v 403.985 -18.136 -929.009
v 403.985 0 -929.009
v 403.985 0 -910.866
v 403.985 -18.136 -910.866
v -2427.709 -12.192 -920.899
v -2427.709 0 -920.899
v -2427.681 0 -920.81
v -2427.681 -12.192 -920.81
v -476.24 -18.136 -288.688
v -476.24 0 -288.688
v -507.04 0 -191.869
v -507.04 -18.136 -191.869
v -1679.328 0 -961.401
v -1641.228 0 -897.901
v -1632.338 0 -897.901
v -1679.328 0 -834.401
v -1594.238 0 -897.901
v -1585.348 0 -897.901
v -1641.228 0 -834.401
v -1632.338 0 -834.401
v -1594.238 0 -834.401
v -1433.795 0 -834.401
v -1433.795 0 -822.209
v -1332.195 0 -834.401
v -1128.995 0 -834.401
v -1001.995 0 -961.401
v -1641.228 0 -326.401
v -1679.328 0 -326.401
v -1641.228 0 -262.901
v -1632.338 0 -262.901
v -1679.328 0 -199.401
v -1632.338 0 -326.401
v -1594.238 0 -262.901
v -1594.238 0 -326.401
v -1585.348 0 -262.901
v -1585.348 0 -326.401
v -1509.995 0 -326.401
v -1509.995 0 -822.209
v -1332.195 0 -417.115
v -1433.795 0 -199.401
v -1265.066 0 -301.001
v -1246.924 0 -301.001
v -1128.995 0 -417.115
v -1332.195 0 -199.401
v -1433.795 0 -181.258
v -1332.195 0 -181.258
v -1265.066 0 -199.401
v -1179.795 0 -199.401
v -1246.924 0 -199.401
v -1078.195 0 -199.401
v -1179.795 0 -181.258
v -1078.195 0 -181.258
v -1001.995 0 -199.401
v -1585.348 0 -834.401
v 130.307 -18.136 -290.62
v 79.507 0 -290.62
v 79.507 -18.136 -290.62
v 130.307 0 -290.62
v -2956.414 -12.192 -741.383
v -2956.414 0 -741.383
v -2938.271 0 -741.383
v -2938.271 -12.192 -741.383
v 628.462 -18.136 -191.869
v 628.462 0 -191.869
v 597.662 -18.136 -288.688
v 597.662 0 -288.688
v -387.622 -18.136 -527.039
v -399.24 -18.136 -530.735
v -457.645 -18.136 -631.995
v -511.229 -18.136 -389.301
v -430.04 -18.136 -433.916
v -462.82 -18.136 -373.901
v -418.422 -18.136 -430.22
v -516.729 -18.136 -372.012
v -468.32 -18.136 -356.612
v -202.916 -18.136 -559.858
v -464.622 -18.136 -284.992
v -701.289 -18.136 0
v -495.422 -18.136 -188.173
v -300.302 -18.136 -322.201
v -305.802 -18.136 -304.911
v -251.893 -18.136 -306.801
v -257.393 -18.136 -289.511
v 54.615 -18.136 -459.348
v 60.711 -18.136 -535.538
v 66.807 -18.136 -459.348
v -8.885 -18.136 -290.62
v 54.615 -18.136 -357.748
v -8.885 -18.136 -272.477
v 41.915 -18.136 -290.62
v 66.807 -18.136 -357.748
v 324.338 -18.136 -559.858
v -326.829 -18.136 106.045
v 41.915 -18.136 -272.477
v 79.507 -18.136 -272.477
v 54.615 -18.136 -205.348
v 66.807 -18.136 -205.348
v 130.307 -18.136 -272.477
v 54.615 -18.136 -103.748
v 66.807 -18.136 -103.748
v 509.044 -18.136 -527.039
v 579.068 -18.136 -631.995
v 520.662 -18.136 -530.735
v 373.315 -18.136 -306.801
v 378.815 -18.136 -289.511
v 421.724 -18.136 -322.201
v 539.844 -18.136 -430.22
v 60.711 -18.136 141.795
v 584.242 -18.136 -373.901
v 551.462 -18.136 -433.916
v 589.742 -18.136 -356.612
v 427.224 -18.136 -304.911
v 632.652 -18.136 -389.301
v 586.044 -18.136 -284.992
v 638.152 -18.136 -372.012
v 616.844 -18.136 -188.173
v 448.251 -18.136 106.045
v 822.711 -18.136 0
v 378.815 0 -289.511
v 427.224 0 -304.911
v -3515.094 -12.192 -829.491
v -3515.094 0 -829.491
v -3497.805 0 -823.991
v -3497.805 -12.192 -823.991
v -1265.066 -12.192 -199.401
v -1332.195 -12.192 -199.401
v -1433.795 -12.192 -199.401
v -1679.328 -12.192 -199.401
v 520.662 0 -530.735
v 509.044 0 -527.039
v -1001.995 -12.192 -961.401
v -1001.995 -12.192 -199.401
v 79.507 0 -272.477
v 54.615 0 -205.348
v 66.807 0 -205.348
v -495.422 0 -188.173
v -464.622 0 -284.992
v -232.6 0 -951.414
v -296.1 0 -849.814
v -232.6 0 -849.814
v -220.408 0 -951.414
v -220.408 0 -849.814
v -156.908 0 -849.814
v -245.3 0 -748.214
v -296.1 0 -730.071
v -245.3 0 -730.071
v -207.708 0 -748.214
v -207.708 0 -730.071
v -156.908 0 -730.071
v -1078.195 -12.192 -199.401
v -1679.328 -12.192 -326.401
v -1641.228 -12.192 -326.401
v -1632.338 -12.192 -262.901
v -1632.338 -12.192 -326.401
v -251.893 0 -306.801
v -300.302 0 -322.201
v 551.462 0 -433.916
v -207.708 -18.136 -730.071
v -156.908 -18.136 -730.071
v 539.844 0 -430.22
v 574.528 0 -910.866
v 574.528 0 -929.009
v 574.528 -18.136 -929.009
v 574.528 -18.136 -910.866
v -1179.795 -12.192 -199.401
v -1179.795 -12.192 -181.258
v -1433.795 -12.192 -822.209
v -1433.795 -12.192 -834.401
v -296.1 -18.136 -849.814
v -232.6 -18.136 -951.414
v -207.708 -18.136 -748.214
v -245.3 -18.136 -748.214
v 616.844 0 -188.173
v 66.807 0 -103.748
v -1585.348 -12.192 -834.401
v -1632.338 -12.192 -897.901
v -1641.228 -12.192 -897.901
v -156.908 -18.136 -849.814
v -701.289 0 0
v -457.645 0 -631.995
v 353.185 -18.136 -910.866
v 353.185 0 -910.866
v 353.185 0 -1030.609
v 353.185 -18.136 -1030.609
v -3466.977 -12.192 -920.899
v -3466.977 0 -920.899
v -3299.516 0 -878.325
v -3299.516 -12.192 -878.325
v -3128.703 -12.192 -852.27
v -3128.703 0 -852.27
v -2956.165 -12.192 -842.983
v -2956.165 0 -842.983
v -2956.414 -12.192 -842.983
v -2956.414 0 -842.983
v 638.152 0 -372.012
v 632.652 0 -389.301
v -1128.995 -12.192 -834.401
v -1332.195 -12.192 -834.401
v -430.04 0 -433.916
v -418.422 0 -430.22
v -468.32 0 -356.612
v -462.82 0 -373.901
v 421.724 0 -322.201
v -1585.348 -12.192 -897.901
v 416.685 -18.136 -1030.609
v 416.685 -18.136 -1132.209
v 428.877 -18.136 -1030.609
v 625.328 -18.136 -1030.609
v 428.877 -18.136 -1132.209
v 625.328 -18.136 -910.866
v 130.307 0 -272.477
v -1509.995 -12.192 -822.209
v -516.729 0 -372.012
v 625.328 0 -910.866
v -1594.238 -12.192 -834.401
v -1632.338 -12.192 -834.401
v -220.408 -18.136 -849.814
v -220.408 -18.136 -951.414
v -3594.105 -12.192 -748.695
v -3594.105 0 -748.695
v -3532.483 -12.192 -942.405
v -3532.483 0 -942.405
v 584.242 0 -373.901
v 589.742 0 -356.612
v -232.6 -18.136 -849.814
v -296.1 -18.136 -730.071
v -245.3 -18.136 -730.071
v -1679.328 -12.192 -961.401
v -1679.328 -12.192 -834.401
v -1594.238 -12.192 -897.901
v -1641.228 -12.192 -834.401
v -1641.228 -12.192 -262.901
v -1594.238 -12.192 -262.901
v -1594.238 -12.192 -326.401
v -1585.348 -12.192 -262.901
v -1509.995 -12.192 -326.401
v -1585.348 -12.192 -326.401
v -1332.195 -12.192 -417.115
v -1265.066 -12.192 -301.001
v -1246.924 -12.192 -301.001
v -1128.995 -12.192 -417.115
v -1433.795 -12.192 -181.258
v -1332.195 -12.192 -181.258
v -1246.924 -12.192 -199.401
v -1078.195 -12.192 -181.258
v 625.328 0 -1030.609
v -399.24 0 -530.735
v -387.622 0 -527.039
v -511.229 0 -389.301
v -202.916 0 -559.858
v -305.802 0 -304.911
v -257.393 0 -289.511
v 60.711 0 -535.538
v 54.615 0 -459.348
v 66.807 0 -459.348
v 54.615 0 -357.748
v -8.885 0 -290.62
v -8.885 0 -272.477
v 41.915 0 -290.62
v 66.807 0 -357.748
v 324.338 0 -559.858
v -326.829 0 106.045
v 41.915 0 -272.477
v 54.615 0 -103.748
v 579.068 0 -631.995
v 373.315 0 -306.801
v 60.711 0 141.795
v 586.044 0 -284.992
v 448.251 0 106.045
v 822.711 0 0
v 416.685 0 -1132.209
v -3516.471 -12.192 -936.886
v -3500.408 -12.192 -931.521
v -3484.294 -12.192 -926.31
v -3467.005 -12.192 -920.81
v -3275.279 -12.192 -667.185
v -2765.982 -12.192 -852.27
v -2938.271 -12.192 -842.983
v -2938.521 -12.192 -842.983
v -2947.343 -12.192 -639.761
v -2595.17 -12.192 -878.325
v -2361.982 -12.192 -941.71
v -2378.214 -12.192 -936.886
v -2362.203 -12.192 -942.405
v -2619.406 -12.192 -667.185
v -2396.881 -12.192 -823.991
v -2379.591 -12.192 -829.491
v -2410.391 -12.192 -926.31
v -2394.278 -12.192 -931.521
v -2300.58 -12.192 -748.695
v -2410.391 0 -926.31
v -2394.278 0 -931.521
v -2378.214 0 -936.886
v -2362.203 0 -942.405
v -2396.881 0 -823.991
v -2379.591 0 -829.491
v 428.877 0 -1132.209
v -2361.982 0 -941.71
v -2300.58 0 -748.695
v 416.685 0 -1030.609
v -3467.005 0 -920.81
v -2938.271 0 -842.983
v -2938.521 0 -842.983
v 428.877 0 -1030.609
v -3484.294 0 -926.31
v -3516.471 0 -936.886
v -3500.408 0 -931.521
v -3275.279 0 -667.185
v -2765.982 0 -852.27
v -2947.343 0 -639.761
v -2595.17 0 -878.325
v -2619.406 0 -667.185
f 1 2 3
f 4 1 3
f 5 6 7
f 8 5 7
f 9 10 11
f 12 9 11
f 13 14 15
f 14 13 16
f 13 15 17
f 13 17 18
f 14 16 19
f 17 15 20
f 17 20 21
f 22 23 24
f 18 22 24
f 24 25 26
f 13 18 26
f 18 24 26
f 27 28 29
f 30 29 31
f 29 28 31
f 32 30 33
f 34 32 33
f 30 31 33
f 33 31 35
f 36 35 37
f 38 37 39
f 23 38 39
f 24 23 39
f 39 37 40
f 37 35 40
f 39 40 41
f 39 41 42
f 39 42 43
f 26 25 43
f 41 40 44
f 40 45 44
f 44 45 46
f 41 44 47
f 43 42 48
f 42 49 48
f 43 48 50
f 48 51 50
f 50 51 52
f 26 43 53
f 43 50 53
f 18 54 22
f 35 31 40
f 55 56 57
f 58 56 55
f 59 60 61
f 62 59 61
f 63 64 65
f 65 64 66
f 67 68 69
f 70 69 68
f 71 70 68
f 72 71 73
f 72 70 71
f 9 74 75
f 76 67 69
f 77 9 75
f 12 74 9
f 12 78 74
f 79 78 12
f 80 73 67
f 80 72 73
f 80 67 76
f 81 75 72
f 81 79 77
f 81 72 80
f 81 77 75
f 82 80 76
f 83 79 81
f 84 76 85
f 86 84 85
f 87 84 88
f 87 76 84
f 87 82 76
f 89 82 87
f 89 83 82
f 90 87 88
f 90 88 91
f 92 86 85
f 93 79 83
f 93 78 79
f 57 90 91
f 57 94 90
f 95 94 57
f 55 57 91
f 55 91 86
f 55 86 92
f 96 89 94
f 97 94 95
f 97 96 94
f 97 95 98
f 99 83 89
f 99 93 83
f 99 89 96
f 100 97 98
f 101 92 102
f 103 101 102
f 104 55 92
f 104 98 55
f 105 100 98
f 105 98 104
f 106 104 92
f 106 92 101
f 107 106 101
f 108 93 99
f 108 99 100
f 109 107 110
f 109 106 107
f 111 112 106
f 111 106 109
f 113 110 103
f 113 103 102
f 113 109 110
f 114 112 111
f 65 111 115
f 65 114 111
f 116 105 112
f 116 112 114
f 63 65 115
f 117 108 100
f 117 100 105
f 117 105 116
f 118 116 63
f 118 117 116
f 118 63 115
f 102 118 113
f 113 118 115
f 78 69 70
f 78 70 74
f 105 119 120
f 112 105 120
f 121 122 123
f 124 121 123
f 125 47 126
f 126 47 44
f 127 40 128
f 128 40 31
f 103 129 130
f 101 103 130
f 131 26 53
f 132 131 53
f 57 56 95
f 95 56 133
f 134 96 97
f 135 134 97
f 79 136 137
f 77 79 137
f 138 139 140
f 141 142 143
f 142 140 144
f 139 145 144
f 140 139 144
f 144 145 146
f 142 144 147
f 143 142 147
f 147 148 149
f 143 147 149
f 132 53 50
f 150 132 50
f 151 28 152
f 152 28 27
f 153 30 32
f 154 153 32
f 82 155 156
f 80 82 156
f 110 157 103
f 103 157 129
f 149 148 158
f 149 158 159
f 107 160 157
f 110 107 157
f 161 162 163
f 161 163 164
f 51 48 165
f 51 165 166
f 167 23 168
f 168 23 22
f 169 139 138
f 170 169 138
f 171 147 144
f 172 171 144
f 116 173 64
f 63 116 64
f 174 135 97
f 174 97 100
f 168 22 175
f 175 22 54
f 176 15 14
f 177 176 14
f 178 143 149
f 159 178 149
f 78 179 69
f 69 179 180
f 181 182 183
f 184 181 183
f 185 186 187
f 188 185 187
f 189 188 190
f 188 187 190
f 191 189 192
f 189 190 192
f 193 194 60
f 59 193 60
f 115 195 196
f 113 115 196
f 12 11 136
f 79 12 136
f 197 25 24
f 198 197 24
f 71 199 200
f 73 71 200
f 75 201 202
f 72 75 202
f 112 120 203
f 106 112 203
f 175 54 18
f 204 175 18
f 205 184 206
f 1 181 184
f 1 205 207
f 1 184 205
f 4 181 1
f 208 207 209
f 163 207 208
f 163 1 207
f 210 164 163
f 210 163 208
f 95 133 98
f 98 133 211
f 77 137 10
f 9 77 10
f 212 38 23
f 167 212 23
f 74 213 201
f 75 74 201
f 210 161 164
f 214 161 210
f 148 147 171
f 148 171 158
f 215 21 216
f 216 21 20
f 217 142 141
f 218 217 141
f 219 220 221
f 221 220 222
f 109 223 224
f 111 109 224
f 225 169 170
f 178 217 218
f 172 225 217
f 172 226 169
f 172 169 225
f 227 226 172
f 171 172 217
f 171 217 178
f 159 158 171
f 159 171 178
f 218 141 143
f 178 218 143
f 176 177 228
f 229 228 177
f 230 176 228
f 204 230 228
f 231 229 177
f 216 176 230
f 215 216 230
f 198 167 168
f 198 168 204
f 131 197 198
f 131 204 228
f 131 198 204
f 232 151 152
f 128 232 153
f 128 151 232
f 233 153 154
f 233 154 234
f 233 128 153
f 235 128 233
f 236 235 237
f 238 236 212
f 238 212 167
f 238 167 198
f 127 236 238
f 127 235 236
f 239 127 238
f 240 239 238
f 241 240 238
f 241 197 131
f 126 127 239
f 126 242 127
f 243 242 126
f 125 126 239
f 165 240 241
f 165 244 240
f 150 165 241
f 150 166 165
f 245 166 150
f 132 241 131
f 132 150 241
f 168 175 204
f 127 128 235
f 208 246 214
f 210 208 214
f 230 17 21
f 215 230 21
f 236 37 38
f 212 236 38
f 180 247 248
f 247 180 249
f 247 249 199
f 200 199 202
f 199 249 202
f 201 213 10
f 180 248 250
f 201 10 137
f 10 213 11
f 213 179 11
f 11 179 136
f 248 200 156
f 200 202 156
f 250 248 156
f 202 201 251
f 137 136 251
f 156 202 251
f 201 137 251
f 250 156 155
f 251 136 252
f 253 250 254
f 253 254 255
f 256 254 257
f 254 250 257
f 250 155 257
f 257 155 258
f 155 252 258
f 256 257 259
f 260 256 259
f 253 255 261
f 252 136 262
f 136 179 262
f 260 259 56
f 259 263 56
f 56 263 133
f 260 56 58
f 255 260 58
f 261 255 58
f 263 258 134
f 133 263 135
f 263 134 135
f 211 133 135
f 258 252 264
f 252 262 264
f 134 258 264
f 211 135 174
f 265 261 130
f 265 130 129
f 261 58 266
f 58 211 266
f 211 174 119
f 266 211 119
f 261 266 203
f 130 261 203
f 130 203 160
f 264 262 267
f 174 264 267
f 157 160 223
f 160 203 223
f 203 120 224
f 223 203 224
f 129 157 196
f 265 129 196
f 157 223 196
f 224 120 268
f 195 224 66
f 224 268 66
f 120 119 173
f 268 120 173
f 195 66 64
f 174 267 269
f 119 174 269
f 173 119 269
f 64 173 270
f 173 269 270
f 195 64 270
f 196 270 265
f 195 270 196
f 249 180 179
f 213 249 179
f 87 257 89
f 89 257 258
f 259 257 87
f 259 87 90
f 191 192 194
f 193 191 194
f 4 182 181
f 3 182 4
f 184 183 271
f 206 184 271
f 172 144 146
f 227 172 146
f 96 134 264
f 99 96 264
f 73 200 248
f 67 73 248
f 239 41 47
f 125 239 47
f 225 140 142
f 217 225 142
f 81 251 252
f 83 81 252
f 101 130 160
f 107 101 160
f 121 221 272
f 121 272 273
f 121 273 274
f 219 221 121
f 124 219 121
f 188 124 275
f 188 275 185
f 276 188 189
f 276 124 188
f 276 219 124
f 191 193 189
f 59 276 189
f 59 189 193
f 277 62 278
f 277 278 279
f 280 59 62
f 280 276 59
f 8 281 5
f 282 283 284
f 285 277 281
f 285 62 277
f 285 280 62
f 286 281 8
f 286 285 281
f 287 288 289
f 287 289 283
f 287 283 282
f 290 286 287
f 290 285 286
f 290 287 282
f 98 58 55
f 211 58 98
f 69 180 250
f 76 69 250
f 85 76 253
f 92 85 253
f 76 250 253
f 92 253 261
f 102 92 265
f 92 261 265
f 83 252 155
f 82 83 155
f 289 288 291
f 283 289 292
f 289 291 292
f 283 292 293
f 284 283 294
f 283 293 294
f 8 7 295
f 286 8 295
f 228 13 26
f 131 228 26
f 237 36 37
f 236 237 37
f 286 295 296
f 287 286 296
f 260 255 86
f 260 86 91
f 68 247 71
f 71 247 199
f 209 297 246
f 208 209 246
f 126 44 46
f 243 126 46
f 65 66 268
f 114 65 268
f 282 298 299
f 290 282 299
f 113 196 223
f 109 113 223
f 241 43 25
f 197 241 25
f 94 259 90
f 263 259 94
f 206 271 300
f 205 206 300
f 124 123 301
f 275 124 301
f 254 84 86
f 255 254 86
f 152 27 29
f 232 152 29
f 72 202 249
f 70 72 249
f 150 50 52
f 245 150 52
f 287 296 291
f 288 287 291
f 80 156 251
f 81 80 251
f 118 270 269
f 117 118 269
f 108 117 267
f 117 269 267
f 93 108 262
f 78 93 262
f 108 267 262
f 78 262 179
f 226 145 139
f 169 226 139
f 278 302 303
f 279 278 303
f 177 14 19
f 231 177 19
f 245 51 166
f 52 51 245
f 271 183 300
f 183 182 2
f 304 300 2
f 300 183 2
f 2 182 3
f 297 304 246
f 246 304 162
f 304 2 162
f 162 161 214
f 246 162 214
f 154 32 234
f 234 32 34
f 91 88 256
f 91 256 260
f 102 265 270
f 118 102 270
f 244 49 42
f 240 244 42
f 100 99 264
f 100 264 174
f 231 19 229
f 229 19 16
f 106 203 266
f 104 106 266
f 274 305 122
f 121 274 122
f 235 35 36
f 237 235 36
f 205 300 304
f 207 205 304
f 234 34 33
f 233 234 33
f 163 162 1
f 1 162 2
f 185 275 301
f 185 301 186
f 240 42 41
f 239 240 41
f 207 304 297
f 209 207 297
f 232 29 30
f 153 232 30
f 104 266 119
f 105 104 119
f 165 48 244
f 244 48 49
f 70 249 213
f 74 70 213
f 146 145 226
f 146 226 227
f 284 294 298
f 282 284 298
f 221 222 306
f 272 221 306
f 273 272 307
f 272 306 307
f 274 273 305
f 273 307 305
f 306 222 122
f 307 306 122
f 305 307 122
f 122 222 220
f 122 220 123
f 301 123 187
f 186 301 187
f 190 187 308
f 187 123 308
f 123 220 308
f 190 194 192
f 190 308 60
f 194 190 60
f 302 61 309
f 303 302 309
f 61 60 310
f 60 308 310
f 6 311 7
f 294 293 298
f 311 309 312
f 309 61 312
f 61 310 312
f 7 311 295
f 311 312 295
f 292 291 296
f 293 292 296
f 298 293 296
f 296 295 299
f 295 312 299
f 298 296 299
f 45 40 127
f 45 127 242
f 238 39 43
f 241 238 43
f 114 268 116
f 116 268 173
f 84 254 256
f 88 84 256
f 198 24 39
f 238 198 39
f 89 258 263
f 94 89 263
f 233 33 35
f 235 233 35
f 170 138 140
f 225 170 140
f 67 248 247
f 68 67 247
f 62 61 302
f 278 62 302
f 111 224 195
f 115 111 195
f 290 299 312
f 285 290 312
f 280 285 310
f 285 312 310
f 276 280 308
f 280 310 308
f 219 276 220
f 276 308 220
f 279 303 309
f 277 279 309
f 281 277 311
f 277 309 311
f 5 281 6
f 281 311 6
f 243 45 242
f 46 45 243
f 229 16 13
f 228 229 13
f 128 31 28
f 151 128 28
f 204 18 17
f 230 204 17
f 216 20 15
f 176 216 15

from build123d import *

# Parameters (mm, degrees)
F0_W     = 50.8
F0_H     = 18.1428571429
F1_DEPTH = 18.1356
F0_W_2   = 12.192
F0_H_2   = 101.6
F2_DEPTH = 12.192
F0_W_3   = 101.6


# Not quite as in the source:
# - a feature names something its author has since deleted; it is built from what else it names


with BuildPart() as f1:
    # F0 (on Front) → F1 (new body)
    with BuildSketch(Plane.XZ):
        Polygon((-245.2995117426, -748.2141169548), (-296.0995117426, -748.2141169548), (-296.0995117426, -849.8141169548), (-232.5995117426, -951.4141169548), (-232.5995117426, -849.8141169548), (-220.4075117426, -849.8141169548), (-220.4075117426, -951.4141169548), (-156.9075117426, -849.8141169548), (-156.9075117426, -748.2141169548), (-207.7075117426, -748.2141169548), align=None)
        with Locations((-182.3075117426, -739.1426883834)):
            Rectangle(F0_W, F0_H)
        with Locations((-270.6995117426, -739.1426883834)):
            Rectangle(F0_W, F0_H)
    extrude(amount=F1_DEPTH)


with BuildPart() as f1b:
    # F0 (on Front) → F1, piece 2 (new body)
    with BuildSketch(Plane.XZ):
        with BuildLine():
            Line((579.0676757709, -631.9954848741), (822.7111684876, 0))
            ThreePointArc((822.7111684876, 0), (60.7111684876, 141.7950471023), (-701.2888315124, 0))
            Line((-701.2888315124, 0), (-457.6453387957, -631.9954848741))
            ThreePointArc((-457.6453387957, -631.9954848741), (60.7111684876, -535.538286231), (579.0676757709, -631.9954848741))
        make_face()
        Polygon((-399.2400596646, -530.7352252686), (-430.0400842711, -433.9162266978), (-418.4218044426, -430.220223745), (-387.6217798361, -527.0392223158), align=None, mode=Mode.SUBTRACT)
        Polygon((-511.2292535926, -389.3006604553), (-516.7292579866, -372.0115535677), (-468.3197587013, -356.6115412645), (-462.8197543072, -373.9006481521), align=None, mode=Mode.SUBTRACT)
        Polygon((-464.6218413522, -284.9917258889), (-476.2401211807, -288.6877288417), (-507.0401457871, -191.8687302709), (-495.4218659586, -188.1727273182), align=None, mode=Mode.SUBTRACT)
        with Locations((60.7111684876, -408.5482073413)):
            Rectangle(F0_W_2, F0_H_2, mode=Mode.SUBTRACT)
        Polygon((539.8441414177, -430.220223745), (551.4624212462, -433.9162266978), (520.6623966398, -530.7352252686), (509.0441168113, -527.0392223158), align=None, mode=Mode.SUBTRACT)
        Polygon((589.7420956764, -356.6115412645), (638.1515949618, -372.0115535677), (632.6515905678, -389.3006604553), (584.2420912824, -373.9006481521), align=None, mode=Mode.SUBTRACT)
        Polygon((-300.3021495635, -322.2006068485), (-305.8021539575, -304.9114999608), (-257.3926546721, -289.5114876576), (-251.8926502781, -306.8005945453), align=None, mode=Mode.SUBTRACT)
        with Locations((16.5151684876, -281.5482073413)):
            Rectangle(F0_W, F0_H, mode=Mode.SUBTRACT)
        with Locations((104.9071684876, -281.5482073413)):
            Rectangle(F0_W, F0_H, mode=Mode.SUBTRACT)
        Polygon((373.3149872532, -306.8005945453), (378.8149916472, -289.5114876576), (427.2244909326, -304.9114999608), (421.7244865386, -322.2006068485), align=None, mode=Mode.SUBTRACT)
        Polygon((628.4624827623, -191.8687302709), (597.6624581558, -288.6877288417), (586.0441783273, -284.9917258889), (616.8442029338, -188.1727273182), align=None, mode=Mode.SUBTRACT)
        with Locations((60.7111684876, -154.5482073413)):
            Rectangle(F0_W_2, F0_H_2, mode=Mode.SUBTRACT)
    extrude(amount=F1_DEPTH)


with BuildPart() as f1c:
    # F0 (on Front) → F1, piece 3 (new body)
    with BuildSketch(Plane.XZ):
        with Locations((378.5851431642, -919.9377022879)):
            Rectangle(F0_W, F0_H)
        Polygon((403.9851431642, -929.0091308594), (353.1851431642, -929.0091308594), (353.1851431642, -1030.6091308594), (416.6851431642, -1132.2091308594), (416.6851431642, -1030.6091308594), (428.8771431642, -1030.6091308594), (428.8771431642, -1132.2091308594), (625.3280003071, -1030.6091308594), (625.3280003071, -929.0091308594), (574.5280003071, -929.0091308594), align=None)
        with Locations((599.9280003071, -919.9377022879)):
            Rectangle(F0_W, F0_H)
    extrude(amount=F1_DEPTH)


with BuildPart() as f2:
    # F0 (on Front) → F2 (new body)
    with BuildSketch(Plane.XZ):
        with BuildLine():
            Line((-2956.4141467797, -741.3827241583), (-2938.2712896368, -741.3827241583))
            Line((-2938.2712896368, -741.3827241583), (-2938.2712896368, -842.9827241583))
            Line((-2938.2712896368, -842.9827241583), (-2938.5207805782, -842.9827241583))
            ThreePointArc((-2938.5207805782, -842.9827241583), (-2680.2581818501, -863.2133164178), (-2427.7087045022, -920.8987414075))
            Line((-2427.7087045022, -920.8987414075), (-2427.6805354276, -920.8101927253))
            Line((-2427.6805354276, -920.8101927253), (-2396.8805108212, -823.9911941546))
            Line((-2396.8805108212, -823.9911941546), (-2379.5914039336, -829.4911985486))
            Line((-2379.5914039336, -829.4911985486), (-2410.39142854, -926.3101971193))
            ThreePointArc((-2410.39142854, -926.3101971193), (-2386.2394133775, -934.184590775), (-2362.202814439, -942.4045556973))
            Line((-2362.202814439, -942.4045556973), (-2361.9819292546, -941.7102094226))
            Line((-2361.9819292546, -941.7102094226), (-2331.1819046482, -844.8912108518))
            Line((-2331.1819046482, -844.8912108518), (-2300.5800248164, -748.6950747267))
            ThreePointArc((-2300.5800248164, -748.6950747267), (-2947.3427182083, -639.7607545087), (-3594.1054116001, -748.6950747267))
            Line((-3594.1054116001, -748.6950747267), (-3532.4826219776, -942.4045556973))
            ThreePointArc((-3532.4826219776, -942.4045556973), (-3508.446023039, -934.184590775), (-3484.2940078765, -926.3101971193))
            Line((-3484.2940078765, -926.3101971193), (-3515.0940324829, -829.4911985486))
            Line((-3515.0940324829, -829.4911985486), (-3497.8049255953, -823.9911941546))
            Line((-3497.8049255953, -823.9911941546), (-3467.0049009889, -920.8101927253))
            Line((-3467.0049009889, -920.8101927253), (-3466.9767319143, -920.8987414075))
            ThreePointArc((-3466.9767319143, -920.8987414075), (-3214.4272545664, -863.2133164178), (-2956.1646558383, -842.9827241583))
            Line((-2956.1646558383, -842.9827241583), (-2956.4141467797, -842.9827241583))
            Line((-2956.4141467797, -842.9827241583), (-2956.4141467797, -741.3827241583))
        make_face()
    extrude(amount=F2_DEPTH)


with BuildPart() as f2b:
    # F0 (on Front) → F2, piece 2 (new body)
    with BuildSketch(Plane.XZ):
        Polygon((-1433.7949680964, -199.4009857178), (-1509.9949680964, -199.4009857178), (-1679.3283014297, -199.4009857178), (-1679.3283014297, -326.4009857178), (-1641.2283014297, -326.4009857178), (-1641.2283014297, -262.9009857178), (-1632.3383014297, -262.9009857178), (-1632.3383014297, -326.4009857178), (-1594.2383014297, -326.4009857178), (-1594.2383014297, -262.9009857178), (-1585.3483014297, -262.9009857178), (-1585.3483014297, -326.4009857178), (-1509.9949680964, -326.4009857178), (-1509.9949680964, -822.2089857178), (-1433.7949680964, -822.2089857178), (-1433.7949680964, -834.4009857178), (-1509.9949680964, -834.4009857178), (-1585.3483014297, -834.4009857178), (-1585.3483014297, -897.9009857178), (-1594.2383014297, -897.9009857178), (-1594.2383014297, -834.4009857178), (-1632.3383014297, -834.4009857178), (-1632.3383014297, -897.9009857178), (-1641.2283014297, -897.9009857178), (-1641.2283014297, -834.4009857178), (-1679.3283014297, -834.4009857178), (-1679.3283014297, -961.4009857178), (-1509.9949680964, -961.4009857178), (-1001.9949680964, -961.4009857178), (-1001.9949680964, -199.4009857178), (-1078.1949680964, -199.4009857178), (-1179.7949680964, -199.4009857178), (-1246.923539525, -199.4009857178), (-1246.923539525, -301.0009857178), (-1265.0663966678, -301.0009857178), (-1265.0663966678, -199.4009857178), (-1332.1949680964, -199.4009857178), align=None)
        Polygon((-1332.1949680964, -815.8589857178), (-1332.1949680964, -417.1152714321), (-1128.9949680964, -417.1152714321), (-1128.9949680964, -834.4009857178), (-1332.1949680964, -834.4009857178), align=None, mode=Mode.SUBTRACT)
        with Locations((-1382.9949680964, -190.3295571463)):
            Rectangle(F0_W_3, F0_H)
        with Locations((-1128.9949680964, -190.3295571463)):
            Rectangle(F0_W_3, F0_H)
    extrude(amount=F2_DEPTH)


solid = Compound([f1.part, f1b.part, f1c.part, f2.part, f2b.part])
